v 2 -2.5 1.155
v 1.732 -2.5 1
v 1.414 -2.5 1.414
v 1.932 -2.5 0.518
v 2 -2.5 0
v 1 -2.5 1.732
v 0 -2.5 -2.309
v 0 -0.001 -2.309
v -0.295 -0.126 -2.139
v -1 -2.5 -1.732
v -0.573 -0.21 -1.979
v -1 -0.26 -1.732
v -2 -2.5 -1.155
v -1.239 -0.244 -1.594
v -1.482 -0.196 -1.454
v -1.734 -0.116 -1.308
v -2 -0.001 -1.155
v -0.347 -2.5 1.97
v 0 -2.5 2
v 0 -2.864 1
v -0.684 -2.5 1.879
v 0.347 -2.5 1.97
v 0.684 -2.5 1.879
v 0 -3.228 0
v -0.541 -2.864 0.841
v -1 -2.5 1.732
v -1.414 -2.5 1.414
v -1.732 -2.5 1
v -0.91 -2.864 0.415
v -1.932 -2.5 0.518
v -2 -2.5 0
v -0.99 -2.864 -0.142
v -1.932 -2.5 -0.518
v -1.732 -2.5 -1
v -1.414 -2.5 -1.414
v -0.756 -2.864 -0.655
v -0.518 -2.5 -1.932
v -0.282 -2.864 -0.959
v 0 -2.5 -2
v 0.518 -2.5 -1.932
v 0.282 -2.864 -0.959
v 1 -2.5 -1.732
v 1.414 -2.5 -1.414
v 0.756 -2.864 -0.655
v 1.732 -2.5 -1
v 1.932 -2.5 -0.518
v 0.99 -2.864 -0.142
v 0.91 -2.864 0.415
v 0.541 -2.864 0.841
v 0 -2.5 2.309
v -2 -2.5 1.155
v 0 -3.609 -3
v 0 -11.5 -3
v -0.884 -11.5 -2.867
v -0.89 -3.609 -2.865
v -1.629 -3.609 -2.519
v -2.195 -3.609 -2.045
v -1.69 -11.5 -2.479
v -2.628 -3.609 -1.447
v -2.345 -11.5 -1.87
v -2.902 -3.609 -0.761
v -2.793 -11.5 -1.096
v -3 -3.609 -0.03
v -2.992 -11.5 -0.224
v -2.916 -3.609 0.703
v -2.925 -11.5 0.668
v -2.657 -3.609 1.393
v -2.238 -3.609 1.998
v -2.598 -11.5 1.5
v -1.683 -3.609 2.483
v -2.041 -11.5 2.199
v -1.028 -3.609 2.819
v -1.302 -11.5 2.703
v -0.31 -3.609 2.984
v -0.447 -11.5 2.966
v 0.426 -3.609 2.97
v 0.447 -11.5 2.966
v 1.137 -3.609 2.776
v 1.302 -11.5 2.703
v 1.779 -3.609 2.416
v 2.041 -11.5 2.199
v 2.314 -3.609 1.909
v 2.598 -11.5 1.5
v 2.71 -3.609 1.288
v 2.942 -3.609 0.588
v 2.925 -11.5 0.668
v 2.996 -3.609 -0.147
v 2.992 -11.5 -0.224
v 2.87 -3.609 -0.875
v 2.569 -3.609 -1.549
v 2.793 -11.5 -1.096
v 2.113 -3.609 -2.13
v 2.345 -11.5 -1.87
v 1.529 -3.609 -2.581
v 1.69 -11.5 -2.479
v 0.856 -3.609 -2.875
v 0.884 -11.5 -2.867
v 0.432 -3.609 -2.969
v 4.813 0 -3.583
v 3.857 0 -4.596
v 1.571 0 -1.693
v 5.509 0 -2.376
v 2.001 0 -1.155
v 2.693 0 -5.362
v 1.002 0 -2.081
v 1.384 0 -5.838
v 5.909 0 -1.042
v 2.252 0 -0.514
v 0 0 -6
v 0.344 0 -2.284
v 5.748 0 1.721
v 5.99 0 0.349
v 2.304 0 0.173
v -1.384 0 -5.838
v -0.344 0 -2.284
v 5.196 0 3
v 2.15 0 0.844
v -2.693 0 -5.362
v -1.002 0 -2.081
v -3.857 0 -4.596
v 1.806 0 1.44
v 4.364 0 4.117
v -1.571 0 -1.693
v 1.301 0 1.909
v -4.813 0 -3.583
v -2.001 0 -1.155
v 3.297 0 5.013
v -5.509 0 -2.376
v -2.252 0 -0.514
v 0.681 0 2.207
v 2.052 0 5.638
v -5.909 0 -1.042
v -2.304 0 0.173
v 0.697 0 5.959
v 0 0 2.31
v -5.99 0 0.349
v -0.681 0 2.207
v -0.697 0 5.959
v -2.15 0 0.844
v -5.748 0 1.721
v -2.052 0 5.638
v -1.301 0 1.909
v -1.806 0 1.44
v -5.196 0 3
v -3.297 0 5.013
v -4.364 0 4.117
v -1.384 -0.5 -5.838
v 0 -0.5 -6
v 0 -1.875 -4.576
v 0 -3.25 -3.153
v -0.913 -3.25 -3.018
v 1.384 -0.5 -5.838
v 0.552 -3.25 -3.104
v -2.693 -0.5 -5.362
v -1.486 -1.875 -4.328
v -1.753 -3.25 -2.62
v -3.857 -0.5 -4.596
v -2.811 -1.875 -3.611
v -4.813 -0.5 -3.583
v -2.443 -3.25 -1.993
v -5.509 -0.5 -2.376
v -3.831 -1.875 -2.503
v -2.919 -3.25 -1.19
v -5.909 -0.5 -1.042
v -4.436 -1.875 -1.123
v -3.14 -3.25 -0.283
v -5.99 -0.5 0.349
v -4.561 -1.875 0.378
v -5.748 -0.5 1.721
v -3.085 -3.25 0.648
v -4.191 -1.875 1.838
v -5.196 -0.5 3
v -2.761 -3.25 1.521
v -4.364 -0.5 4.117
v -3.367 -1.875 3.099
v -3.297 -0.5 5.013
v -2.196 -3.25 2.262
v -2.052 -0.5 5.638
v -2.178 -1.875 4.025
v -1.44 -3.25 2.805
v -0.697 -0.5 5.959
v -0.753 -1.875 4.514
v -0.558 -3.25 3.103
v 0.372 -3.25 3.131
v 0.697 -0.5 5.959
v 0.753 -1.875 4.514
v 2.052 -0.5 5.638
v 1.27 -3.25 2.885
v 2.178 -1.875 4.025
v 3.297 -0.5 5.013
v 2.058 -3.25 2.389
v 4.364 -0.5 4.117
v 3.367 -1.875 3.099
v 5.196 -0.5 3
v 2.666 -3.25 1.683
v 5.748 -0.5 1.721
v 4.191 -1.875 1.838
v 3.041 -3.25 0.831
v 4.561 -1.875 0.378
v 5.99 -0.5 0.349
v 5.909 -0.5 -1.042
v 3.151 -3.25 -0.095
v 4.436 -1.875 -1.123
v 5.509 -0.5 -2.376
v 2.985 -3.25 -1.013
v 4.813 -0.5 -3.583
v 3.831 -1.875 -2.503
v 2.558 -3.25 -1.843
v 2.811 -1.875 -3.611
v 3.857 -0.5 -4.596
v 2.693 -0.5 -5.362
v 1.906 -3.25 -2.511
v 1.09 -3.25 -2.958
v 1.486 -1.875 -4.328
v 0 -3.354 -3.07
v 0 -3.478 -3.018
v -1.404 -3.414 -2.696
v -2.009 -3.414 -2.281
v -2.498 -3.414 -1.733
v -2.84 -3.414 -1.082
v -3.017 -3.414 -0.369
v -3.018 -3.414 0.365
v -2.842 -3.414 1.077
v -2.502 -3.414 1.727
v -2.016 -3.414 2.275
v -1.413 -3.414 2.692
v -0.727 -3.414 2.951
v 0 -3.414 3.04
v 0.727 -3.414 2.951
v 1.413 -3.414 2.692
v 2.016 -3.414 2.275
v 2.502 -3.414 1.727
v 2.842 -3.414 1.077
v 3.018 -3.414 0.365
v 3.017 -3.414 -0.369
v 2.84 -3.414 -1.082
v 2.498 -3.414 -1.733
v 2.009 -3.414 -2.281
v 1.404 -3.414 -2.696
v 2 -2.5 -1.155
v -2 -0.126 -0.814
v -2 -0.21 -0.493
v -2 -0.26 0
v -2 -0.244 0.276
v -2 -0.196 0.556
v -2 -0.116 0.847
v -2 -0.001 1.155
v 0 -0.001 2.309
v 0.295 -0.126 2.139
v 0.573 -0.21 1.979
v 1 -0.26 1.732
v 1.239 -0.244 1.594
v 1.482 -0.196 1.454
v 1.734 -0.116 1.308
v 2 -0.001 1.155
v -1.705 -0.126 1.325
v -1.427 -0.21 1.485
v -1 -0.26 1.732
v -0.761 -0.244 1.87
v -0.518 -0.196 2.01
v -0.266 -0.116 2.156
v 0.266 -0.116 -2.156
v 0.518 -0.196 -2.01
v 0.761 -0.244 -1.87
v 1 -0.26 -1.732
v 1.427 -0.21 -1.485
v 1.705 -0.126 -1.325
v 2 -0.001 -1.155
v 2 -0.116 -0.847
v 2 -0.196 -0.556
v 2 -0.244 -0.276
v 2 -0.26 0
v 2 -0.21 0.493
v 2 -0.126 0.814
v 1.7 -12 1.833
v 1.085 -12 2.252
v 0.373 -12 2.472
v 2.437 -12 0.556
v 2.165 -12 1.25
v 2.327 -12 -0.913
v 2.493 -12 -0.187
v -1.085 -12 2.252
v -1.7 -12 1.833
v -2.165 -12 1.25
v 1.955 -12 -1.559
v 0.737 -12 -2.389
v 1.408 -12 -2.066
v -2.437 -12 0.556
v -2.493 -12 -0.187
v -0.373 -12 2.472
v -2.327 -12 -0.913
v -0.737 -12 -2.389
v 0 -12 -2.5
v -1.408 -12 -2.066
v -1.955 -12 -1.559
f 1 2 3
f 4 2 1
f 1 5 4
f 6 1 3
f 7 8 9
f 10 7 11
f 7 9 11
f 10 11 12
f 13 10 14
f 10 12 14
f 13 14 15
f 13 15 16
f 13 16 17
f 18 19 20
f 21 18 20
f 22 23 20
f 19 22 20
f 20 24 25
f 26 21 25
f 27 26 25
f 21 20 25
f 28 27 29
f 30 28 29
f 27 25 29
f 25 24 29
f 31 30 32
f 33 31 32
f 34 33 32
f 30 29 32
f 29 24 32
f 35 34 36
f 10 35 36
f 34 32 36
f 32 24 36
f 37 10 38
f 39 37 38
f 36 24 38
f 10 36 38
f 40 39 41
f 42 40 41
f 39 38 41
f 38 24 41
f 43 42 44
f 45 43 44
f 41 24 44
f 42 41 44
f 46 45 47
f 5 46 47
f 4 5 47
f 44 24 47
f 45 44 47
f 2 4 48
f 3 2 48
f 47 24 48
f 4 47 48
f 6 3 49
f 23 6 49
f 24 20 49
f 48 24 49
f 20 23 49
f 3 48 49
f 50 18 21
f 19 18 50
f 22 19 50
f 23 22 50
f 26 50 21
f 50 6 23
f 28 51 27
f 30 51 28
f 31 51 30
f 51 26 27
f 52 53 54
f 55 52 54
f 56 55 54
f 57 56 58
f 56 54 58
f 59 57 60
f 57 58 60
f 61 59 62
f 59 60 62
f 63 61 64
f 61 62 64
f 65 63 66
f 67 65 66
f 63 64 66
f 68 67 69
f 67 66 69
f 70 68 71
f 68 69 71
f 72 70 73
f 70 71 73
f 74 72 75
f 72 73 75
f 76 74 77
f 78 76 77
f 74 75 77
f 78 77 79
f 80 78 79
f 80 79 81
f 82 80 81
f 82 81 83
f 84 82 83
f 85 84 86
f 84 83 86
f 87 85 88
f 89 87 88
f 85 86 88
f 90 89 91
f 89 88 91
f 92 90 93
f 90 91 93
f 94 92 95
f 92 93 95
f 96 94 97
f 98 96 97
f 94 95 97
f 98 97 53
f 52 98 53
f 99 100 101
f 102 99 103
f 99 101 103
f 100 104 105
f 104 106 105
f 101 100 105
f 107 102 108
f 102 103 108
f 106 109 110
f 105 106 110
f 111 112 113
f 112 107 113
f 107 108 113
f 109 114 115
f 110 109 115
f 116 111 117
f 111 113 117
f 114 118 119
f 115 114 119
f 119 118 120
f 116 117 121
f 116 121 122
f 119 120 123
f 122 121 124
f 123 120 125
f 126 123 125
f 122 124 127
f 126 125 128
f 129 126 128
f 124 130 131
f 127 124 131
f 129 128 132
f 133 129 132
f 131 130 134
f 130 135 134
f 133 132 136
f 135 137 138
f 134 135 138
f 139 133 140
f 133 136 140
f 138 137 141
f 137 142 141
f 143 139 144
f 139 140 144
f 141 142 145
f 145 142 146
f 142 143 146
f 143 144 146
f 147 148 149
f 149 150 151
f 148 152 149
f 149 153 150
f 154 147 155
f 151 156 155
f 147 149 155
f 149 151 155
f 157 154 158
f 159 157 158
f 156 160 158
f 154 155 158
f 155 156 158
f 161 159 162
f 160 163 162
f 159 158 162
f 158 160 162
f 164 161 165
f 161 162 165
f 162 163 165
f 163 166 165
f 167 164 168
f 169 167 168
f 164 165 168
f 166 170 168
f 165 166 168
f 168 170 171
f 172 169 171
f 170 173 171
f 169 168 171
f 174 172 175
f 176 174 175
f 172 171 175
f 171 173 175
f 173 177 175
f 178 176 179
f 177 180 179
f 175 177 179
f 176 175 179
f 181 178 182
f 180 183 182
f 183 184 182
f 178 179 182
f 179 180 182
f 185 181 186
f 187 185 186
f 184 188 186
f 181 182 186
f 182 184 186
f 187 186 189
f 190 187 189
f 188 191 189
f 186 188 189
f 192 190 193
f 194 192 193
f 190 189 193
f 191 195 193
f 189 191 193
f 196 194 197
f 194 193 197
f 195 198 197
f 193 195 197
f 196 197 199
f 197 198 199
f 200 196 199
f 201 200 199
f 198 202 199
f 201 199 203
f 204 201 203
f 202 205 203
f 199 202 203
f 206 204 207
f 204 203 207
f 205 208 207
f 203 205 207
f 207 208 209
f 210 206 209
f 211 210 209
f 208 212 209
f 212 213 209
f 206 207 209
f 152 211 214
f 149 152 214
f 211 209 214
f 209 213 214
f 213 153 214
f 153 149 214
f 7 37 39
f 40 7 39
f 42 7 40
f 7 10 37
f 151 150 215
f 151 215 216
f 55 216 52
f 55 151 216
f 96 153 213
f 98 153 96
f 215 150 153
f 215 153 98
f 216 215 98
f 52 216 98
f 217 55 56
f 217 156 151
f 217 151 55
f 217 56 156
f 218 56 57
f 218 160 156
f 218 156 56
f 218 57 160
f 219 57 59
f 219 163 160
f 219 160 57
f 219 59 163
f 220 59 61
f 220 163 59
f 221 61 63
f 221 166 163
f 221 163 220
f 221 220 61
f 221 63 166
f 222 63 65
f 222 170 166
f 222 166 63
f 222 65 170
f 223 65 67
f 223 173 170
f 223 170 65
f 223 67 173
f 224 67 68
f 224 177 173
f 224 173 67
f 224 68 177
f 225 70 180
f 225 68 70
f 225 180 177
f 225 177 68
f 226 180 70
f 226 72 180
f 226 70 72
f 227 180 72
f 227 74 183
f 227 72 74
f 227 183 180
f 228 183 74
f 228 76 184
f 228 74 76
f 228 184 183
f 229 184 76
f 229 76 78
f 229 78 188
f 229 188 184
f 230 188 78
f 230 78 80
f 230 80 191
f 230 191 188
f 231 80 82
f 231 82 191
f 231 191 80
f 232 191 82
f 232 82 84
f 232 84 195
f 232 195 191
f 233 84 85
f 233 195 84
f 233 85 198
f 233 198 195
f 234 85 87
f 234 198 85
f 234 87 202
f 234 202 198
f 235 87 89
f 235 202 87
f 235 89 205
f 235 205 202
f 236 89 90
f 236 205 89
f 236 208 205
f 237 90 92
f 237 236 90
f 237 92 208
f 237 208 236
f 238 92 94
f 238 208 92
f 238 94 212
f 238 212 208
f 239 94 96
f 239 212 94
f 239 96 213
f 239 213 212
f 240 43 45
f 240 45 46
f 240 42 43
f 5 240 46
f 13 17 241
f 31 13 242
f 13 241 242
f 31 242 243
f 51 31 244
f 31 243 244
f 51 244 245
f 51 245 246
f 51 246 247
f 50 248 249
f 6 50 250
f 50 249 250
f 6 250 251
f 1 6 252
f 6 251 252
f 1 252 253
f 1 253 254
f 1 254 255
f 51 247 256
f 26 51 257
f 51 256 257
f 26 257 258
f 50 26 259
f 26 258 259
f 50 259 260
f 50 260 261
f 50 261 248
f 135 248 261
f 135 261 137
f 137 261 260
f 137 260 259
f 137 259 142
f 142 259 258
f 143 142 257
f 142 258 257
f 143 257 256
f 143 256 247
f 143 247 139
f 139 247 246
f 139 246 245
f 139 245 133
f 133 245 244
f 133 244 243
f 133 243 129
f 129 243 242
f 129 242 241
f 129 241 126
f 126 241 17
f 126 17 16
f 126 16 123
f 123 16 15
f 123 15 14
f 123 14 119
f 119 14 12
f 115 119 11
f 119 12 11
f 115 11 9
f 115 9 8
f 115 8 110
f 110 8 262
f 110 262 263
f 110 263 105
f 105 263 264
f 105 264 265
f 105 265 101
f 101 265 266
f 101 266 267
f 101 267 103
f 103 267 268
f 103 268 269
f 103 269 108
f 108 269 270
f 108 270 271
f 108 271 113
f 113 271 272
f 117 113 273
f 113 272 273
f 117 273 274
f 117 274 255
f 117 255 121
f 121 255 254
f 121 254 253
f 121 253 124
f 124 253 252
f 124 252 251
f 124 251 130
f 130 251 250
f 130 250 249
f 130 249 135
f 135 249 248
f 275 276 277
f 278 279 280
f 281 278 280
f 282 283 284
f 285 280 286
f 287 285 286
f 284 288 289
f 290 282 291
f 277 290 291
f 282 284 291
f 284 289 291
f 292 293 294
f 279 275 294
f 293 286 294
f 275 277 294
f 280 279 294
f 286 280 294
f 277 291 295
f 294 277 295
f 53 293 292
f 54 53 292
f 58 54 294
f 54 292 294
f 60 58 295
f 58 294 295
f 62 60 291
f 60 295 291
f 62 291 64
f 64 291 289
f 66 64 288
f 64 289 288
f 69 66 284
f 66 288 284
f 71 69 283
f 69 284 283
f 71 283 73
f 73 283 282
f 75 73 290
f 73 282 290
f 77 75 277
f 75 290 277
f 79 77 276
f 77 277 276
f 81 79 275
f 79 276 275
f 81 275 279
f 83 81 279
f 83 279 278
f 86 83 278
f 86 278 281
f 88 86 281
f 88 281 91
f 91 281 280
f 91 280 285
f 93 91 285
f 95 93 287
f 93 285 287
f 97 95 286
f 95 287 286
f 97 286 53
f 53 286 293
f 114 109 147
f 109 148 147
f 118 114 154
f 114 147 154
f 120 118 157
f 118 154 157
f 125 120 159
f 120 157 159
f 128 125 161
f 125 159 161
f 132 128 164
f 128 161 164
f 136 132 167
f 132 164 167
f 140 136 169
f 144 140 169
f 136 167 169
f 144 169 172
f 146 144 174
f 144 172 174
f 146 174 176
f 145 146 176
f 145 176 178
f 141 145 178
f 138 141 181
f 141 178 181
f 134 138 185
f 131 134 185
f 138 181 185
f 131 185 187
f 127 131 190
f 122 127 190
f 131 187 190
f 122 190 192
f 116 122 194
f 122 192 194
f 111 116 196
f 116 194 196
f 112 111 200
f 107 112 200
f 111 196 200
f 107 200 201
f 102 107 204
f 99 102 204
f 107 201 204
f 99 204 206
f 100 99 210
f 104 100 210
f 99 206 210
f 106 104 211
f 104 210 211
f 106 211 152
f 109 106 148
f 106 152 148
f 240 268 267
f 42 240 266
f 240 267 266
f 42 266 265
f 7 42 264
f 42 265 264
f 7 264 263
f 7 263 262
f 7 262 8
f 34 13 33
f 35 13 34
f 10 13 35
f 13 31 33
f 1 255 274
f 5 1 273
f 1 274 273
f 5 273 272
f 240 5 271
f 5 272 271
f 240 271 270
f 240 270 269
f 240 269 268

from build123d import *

# Parameters (mm, degrees)
CUT_EXTRUDE1_DEPTH = 2.5
FILLET1_R          = 0.5
CHAMFER1_SIZE      = 0.5


with BuildPart() as part:
    # Sketch1 → Revolve1 (revolve)
    with BuildSketch(Plane.XY, mode=Mode.PRIVATE) as revolve1_sk:
        Polygon((0, 0), (-6, 0), (-6, -0.5), (-3, -3.397066324), (-3, -12), (0, -12), align=None)
    revolve(revolve1_sk.sketch.rotate(Axis((0, 0, 0), (0, 1, 0)), 270), axis=Axis((0, 0, 0), (0, 1, 0)))

    # Sketch2 → Cut-Extrude1 (cut)
    with BuildSketch(Plane(origin=(0, 0, 0), x_dir=(1, 0, 0), z_dir=(0, 1, 0))):
        Polygon((0, 2.309401077), (-2, 1.154700538), (-2, -1.154700538), (0, -2.309401077), (2, -1.154700538), (2, 1.154700538), align=None)
    extrude(amount=-CUT_EXTRUDE1_DEPTH, mode=Mode.SUBTRACT)

    # Sketch3 → Cut-Revolve1 (revolve, cut)
    with BuildSketch(Plane.XY, mode=Mode.PRIVATE) as cut_revolve1_sk:
        Polygon((-2.31, 0), (-2, -0.260120886), (-2, -2.5), (0, -3.227940469), (0, 0), align=None)
    revolve(cut_revolve1_sk.sketch.rotate(Axis((0, -3.227940469, 0), (0, -1, 0)), 270), axis=Axis((0, -3.227940469, 0), (0, -1, 0)), mode=Mode.SUBTRACT)

    # Fillet1
    fillet1_edges = [part.edges().sort_by_distance(p)[0] for p in [
        (0, -3.397066324, 3),
    ]]
    fillet(fillet1_edges, radius=FILLET1_R)

    # Chamfer1
    chamfer1_edges = [part.edges().sort_by_distance(p)[0] for p in [
        (0, -12, 3),
    ]]
    chamfer(chamfer1_edges, length=CHAMFER1_SIZE)


solid = part.part
